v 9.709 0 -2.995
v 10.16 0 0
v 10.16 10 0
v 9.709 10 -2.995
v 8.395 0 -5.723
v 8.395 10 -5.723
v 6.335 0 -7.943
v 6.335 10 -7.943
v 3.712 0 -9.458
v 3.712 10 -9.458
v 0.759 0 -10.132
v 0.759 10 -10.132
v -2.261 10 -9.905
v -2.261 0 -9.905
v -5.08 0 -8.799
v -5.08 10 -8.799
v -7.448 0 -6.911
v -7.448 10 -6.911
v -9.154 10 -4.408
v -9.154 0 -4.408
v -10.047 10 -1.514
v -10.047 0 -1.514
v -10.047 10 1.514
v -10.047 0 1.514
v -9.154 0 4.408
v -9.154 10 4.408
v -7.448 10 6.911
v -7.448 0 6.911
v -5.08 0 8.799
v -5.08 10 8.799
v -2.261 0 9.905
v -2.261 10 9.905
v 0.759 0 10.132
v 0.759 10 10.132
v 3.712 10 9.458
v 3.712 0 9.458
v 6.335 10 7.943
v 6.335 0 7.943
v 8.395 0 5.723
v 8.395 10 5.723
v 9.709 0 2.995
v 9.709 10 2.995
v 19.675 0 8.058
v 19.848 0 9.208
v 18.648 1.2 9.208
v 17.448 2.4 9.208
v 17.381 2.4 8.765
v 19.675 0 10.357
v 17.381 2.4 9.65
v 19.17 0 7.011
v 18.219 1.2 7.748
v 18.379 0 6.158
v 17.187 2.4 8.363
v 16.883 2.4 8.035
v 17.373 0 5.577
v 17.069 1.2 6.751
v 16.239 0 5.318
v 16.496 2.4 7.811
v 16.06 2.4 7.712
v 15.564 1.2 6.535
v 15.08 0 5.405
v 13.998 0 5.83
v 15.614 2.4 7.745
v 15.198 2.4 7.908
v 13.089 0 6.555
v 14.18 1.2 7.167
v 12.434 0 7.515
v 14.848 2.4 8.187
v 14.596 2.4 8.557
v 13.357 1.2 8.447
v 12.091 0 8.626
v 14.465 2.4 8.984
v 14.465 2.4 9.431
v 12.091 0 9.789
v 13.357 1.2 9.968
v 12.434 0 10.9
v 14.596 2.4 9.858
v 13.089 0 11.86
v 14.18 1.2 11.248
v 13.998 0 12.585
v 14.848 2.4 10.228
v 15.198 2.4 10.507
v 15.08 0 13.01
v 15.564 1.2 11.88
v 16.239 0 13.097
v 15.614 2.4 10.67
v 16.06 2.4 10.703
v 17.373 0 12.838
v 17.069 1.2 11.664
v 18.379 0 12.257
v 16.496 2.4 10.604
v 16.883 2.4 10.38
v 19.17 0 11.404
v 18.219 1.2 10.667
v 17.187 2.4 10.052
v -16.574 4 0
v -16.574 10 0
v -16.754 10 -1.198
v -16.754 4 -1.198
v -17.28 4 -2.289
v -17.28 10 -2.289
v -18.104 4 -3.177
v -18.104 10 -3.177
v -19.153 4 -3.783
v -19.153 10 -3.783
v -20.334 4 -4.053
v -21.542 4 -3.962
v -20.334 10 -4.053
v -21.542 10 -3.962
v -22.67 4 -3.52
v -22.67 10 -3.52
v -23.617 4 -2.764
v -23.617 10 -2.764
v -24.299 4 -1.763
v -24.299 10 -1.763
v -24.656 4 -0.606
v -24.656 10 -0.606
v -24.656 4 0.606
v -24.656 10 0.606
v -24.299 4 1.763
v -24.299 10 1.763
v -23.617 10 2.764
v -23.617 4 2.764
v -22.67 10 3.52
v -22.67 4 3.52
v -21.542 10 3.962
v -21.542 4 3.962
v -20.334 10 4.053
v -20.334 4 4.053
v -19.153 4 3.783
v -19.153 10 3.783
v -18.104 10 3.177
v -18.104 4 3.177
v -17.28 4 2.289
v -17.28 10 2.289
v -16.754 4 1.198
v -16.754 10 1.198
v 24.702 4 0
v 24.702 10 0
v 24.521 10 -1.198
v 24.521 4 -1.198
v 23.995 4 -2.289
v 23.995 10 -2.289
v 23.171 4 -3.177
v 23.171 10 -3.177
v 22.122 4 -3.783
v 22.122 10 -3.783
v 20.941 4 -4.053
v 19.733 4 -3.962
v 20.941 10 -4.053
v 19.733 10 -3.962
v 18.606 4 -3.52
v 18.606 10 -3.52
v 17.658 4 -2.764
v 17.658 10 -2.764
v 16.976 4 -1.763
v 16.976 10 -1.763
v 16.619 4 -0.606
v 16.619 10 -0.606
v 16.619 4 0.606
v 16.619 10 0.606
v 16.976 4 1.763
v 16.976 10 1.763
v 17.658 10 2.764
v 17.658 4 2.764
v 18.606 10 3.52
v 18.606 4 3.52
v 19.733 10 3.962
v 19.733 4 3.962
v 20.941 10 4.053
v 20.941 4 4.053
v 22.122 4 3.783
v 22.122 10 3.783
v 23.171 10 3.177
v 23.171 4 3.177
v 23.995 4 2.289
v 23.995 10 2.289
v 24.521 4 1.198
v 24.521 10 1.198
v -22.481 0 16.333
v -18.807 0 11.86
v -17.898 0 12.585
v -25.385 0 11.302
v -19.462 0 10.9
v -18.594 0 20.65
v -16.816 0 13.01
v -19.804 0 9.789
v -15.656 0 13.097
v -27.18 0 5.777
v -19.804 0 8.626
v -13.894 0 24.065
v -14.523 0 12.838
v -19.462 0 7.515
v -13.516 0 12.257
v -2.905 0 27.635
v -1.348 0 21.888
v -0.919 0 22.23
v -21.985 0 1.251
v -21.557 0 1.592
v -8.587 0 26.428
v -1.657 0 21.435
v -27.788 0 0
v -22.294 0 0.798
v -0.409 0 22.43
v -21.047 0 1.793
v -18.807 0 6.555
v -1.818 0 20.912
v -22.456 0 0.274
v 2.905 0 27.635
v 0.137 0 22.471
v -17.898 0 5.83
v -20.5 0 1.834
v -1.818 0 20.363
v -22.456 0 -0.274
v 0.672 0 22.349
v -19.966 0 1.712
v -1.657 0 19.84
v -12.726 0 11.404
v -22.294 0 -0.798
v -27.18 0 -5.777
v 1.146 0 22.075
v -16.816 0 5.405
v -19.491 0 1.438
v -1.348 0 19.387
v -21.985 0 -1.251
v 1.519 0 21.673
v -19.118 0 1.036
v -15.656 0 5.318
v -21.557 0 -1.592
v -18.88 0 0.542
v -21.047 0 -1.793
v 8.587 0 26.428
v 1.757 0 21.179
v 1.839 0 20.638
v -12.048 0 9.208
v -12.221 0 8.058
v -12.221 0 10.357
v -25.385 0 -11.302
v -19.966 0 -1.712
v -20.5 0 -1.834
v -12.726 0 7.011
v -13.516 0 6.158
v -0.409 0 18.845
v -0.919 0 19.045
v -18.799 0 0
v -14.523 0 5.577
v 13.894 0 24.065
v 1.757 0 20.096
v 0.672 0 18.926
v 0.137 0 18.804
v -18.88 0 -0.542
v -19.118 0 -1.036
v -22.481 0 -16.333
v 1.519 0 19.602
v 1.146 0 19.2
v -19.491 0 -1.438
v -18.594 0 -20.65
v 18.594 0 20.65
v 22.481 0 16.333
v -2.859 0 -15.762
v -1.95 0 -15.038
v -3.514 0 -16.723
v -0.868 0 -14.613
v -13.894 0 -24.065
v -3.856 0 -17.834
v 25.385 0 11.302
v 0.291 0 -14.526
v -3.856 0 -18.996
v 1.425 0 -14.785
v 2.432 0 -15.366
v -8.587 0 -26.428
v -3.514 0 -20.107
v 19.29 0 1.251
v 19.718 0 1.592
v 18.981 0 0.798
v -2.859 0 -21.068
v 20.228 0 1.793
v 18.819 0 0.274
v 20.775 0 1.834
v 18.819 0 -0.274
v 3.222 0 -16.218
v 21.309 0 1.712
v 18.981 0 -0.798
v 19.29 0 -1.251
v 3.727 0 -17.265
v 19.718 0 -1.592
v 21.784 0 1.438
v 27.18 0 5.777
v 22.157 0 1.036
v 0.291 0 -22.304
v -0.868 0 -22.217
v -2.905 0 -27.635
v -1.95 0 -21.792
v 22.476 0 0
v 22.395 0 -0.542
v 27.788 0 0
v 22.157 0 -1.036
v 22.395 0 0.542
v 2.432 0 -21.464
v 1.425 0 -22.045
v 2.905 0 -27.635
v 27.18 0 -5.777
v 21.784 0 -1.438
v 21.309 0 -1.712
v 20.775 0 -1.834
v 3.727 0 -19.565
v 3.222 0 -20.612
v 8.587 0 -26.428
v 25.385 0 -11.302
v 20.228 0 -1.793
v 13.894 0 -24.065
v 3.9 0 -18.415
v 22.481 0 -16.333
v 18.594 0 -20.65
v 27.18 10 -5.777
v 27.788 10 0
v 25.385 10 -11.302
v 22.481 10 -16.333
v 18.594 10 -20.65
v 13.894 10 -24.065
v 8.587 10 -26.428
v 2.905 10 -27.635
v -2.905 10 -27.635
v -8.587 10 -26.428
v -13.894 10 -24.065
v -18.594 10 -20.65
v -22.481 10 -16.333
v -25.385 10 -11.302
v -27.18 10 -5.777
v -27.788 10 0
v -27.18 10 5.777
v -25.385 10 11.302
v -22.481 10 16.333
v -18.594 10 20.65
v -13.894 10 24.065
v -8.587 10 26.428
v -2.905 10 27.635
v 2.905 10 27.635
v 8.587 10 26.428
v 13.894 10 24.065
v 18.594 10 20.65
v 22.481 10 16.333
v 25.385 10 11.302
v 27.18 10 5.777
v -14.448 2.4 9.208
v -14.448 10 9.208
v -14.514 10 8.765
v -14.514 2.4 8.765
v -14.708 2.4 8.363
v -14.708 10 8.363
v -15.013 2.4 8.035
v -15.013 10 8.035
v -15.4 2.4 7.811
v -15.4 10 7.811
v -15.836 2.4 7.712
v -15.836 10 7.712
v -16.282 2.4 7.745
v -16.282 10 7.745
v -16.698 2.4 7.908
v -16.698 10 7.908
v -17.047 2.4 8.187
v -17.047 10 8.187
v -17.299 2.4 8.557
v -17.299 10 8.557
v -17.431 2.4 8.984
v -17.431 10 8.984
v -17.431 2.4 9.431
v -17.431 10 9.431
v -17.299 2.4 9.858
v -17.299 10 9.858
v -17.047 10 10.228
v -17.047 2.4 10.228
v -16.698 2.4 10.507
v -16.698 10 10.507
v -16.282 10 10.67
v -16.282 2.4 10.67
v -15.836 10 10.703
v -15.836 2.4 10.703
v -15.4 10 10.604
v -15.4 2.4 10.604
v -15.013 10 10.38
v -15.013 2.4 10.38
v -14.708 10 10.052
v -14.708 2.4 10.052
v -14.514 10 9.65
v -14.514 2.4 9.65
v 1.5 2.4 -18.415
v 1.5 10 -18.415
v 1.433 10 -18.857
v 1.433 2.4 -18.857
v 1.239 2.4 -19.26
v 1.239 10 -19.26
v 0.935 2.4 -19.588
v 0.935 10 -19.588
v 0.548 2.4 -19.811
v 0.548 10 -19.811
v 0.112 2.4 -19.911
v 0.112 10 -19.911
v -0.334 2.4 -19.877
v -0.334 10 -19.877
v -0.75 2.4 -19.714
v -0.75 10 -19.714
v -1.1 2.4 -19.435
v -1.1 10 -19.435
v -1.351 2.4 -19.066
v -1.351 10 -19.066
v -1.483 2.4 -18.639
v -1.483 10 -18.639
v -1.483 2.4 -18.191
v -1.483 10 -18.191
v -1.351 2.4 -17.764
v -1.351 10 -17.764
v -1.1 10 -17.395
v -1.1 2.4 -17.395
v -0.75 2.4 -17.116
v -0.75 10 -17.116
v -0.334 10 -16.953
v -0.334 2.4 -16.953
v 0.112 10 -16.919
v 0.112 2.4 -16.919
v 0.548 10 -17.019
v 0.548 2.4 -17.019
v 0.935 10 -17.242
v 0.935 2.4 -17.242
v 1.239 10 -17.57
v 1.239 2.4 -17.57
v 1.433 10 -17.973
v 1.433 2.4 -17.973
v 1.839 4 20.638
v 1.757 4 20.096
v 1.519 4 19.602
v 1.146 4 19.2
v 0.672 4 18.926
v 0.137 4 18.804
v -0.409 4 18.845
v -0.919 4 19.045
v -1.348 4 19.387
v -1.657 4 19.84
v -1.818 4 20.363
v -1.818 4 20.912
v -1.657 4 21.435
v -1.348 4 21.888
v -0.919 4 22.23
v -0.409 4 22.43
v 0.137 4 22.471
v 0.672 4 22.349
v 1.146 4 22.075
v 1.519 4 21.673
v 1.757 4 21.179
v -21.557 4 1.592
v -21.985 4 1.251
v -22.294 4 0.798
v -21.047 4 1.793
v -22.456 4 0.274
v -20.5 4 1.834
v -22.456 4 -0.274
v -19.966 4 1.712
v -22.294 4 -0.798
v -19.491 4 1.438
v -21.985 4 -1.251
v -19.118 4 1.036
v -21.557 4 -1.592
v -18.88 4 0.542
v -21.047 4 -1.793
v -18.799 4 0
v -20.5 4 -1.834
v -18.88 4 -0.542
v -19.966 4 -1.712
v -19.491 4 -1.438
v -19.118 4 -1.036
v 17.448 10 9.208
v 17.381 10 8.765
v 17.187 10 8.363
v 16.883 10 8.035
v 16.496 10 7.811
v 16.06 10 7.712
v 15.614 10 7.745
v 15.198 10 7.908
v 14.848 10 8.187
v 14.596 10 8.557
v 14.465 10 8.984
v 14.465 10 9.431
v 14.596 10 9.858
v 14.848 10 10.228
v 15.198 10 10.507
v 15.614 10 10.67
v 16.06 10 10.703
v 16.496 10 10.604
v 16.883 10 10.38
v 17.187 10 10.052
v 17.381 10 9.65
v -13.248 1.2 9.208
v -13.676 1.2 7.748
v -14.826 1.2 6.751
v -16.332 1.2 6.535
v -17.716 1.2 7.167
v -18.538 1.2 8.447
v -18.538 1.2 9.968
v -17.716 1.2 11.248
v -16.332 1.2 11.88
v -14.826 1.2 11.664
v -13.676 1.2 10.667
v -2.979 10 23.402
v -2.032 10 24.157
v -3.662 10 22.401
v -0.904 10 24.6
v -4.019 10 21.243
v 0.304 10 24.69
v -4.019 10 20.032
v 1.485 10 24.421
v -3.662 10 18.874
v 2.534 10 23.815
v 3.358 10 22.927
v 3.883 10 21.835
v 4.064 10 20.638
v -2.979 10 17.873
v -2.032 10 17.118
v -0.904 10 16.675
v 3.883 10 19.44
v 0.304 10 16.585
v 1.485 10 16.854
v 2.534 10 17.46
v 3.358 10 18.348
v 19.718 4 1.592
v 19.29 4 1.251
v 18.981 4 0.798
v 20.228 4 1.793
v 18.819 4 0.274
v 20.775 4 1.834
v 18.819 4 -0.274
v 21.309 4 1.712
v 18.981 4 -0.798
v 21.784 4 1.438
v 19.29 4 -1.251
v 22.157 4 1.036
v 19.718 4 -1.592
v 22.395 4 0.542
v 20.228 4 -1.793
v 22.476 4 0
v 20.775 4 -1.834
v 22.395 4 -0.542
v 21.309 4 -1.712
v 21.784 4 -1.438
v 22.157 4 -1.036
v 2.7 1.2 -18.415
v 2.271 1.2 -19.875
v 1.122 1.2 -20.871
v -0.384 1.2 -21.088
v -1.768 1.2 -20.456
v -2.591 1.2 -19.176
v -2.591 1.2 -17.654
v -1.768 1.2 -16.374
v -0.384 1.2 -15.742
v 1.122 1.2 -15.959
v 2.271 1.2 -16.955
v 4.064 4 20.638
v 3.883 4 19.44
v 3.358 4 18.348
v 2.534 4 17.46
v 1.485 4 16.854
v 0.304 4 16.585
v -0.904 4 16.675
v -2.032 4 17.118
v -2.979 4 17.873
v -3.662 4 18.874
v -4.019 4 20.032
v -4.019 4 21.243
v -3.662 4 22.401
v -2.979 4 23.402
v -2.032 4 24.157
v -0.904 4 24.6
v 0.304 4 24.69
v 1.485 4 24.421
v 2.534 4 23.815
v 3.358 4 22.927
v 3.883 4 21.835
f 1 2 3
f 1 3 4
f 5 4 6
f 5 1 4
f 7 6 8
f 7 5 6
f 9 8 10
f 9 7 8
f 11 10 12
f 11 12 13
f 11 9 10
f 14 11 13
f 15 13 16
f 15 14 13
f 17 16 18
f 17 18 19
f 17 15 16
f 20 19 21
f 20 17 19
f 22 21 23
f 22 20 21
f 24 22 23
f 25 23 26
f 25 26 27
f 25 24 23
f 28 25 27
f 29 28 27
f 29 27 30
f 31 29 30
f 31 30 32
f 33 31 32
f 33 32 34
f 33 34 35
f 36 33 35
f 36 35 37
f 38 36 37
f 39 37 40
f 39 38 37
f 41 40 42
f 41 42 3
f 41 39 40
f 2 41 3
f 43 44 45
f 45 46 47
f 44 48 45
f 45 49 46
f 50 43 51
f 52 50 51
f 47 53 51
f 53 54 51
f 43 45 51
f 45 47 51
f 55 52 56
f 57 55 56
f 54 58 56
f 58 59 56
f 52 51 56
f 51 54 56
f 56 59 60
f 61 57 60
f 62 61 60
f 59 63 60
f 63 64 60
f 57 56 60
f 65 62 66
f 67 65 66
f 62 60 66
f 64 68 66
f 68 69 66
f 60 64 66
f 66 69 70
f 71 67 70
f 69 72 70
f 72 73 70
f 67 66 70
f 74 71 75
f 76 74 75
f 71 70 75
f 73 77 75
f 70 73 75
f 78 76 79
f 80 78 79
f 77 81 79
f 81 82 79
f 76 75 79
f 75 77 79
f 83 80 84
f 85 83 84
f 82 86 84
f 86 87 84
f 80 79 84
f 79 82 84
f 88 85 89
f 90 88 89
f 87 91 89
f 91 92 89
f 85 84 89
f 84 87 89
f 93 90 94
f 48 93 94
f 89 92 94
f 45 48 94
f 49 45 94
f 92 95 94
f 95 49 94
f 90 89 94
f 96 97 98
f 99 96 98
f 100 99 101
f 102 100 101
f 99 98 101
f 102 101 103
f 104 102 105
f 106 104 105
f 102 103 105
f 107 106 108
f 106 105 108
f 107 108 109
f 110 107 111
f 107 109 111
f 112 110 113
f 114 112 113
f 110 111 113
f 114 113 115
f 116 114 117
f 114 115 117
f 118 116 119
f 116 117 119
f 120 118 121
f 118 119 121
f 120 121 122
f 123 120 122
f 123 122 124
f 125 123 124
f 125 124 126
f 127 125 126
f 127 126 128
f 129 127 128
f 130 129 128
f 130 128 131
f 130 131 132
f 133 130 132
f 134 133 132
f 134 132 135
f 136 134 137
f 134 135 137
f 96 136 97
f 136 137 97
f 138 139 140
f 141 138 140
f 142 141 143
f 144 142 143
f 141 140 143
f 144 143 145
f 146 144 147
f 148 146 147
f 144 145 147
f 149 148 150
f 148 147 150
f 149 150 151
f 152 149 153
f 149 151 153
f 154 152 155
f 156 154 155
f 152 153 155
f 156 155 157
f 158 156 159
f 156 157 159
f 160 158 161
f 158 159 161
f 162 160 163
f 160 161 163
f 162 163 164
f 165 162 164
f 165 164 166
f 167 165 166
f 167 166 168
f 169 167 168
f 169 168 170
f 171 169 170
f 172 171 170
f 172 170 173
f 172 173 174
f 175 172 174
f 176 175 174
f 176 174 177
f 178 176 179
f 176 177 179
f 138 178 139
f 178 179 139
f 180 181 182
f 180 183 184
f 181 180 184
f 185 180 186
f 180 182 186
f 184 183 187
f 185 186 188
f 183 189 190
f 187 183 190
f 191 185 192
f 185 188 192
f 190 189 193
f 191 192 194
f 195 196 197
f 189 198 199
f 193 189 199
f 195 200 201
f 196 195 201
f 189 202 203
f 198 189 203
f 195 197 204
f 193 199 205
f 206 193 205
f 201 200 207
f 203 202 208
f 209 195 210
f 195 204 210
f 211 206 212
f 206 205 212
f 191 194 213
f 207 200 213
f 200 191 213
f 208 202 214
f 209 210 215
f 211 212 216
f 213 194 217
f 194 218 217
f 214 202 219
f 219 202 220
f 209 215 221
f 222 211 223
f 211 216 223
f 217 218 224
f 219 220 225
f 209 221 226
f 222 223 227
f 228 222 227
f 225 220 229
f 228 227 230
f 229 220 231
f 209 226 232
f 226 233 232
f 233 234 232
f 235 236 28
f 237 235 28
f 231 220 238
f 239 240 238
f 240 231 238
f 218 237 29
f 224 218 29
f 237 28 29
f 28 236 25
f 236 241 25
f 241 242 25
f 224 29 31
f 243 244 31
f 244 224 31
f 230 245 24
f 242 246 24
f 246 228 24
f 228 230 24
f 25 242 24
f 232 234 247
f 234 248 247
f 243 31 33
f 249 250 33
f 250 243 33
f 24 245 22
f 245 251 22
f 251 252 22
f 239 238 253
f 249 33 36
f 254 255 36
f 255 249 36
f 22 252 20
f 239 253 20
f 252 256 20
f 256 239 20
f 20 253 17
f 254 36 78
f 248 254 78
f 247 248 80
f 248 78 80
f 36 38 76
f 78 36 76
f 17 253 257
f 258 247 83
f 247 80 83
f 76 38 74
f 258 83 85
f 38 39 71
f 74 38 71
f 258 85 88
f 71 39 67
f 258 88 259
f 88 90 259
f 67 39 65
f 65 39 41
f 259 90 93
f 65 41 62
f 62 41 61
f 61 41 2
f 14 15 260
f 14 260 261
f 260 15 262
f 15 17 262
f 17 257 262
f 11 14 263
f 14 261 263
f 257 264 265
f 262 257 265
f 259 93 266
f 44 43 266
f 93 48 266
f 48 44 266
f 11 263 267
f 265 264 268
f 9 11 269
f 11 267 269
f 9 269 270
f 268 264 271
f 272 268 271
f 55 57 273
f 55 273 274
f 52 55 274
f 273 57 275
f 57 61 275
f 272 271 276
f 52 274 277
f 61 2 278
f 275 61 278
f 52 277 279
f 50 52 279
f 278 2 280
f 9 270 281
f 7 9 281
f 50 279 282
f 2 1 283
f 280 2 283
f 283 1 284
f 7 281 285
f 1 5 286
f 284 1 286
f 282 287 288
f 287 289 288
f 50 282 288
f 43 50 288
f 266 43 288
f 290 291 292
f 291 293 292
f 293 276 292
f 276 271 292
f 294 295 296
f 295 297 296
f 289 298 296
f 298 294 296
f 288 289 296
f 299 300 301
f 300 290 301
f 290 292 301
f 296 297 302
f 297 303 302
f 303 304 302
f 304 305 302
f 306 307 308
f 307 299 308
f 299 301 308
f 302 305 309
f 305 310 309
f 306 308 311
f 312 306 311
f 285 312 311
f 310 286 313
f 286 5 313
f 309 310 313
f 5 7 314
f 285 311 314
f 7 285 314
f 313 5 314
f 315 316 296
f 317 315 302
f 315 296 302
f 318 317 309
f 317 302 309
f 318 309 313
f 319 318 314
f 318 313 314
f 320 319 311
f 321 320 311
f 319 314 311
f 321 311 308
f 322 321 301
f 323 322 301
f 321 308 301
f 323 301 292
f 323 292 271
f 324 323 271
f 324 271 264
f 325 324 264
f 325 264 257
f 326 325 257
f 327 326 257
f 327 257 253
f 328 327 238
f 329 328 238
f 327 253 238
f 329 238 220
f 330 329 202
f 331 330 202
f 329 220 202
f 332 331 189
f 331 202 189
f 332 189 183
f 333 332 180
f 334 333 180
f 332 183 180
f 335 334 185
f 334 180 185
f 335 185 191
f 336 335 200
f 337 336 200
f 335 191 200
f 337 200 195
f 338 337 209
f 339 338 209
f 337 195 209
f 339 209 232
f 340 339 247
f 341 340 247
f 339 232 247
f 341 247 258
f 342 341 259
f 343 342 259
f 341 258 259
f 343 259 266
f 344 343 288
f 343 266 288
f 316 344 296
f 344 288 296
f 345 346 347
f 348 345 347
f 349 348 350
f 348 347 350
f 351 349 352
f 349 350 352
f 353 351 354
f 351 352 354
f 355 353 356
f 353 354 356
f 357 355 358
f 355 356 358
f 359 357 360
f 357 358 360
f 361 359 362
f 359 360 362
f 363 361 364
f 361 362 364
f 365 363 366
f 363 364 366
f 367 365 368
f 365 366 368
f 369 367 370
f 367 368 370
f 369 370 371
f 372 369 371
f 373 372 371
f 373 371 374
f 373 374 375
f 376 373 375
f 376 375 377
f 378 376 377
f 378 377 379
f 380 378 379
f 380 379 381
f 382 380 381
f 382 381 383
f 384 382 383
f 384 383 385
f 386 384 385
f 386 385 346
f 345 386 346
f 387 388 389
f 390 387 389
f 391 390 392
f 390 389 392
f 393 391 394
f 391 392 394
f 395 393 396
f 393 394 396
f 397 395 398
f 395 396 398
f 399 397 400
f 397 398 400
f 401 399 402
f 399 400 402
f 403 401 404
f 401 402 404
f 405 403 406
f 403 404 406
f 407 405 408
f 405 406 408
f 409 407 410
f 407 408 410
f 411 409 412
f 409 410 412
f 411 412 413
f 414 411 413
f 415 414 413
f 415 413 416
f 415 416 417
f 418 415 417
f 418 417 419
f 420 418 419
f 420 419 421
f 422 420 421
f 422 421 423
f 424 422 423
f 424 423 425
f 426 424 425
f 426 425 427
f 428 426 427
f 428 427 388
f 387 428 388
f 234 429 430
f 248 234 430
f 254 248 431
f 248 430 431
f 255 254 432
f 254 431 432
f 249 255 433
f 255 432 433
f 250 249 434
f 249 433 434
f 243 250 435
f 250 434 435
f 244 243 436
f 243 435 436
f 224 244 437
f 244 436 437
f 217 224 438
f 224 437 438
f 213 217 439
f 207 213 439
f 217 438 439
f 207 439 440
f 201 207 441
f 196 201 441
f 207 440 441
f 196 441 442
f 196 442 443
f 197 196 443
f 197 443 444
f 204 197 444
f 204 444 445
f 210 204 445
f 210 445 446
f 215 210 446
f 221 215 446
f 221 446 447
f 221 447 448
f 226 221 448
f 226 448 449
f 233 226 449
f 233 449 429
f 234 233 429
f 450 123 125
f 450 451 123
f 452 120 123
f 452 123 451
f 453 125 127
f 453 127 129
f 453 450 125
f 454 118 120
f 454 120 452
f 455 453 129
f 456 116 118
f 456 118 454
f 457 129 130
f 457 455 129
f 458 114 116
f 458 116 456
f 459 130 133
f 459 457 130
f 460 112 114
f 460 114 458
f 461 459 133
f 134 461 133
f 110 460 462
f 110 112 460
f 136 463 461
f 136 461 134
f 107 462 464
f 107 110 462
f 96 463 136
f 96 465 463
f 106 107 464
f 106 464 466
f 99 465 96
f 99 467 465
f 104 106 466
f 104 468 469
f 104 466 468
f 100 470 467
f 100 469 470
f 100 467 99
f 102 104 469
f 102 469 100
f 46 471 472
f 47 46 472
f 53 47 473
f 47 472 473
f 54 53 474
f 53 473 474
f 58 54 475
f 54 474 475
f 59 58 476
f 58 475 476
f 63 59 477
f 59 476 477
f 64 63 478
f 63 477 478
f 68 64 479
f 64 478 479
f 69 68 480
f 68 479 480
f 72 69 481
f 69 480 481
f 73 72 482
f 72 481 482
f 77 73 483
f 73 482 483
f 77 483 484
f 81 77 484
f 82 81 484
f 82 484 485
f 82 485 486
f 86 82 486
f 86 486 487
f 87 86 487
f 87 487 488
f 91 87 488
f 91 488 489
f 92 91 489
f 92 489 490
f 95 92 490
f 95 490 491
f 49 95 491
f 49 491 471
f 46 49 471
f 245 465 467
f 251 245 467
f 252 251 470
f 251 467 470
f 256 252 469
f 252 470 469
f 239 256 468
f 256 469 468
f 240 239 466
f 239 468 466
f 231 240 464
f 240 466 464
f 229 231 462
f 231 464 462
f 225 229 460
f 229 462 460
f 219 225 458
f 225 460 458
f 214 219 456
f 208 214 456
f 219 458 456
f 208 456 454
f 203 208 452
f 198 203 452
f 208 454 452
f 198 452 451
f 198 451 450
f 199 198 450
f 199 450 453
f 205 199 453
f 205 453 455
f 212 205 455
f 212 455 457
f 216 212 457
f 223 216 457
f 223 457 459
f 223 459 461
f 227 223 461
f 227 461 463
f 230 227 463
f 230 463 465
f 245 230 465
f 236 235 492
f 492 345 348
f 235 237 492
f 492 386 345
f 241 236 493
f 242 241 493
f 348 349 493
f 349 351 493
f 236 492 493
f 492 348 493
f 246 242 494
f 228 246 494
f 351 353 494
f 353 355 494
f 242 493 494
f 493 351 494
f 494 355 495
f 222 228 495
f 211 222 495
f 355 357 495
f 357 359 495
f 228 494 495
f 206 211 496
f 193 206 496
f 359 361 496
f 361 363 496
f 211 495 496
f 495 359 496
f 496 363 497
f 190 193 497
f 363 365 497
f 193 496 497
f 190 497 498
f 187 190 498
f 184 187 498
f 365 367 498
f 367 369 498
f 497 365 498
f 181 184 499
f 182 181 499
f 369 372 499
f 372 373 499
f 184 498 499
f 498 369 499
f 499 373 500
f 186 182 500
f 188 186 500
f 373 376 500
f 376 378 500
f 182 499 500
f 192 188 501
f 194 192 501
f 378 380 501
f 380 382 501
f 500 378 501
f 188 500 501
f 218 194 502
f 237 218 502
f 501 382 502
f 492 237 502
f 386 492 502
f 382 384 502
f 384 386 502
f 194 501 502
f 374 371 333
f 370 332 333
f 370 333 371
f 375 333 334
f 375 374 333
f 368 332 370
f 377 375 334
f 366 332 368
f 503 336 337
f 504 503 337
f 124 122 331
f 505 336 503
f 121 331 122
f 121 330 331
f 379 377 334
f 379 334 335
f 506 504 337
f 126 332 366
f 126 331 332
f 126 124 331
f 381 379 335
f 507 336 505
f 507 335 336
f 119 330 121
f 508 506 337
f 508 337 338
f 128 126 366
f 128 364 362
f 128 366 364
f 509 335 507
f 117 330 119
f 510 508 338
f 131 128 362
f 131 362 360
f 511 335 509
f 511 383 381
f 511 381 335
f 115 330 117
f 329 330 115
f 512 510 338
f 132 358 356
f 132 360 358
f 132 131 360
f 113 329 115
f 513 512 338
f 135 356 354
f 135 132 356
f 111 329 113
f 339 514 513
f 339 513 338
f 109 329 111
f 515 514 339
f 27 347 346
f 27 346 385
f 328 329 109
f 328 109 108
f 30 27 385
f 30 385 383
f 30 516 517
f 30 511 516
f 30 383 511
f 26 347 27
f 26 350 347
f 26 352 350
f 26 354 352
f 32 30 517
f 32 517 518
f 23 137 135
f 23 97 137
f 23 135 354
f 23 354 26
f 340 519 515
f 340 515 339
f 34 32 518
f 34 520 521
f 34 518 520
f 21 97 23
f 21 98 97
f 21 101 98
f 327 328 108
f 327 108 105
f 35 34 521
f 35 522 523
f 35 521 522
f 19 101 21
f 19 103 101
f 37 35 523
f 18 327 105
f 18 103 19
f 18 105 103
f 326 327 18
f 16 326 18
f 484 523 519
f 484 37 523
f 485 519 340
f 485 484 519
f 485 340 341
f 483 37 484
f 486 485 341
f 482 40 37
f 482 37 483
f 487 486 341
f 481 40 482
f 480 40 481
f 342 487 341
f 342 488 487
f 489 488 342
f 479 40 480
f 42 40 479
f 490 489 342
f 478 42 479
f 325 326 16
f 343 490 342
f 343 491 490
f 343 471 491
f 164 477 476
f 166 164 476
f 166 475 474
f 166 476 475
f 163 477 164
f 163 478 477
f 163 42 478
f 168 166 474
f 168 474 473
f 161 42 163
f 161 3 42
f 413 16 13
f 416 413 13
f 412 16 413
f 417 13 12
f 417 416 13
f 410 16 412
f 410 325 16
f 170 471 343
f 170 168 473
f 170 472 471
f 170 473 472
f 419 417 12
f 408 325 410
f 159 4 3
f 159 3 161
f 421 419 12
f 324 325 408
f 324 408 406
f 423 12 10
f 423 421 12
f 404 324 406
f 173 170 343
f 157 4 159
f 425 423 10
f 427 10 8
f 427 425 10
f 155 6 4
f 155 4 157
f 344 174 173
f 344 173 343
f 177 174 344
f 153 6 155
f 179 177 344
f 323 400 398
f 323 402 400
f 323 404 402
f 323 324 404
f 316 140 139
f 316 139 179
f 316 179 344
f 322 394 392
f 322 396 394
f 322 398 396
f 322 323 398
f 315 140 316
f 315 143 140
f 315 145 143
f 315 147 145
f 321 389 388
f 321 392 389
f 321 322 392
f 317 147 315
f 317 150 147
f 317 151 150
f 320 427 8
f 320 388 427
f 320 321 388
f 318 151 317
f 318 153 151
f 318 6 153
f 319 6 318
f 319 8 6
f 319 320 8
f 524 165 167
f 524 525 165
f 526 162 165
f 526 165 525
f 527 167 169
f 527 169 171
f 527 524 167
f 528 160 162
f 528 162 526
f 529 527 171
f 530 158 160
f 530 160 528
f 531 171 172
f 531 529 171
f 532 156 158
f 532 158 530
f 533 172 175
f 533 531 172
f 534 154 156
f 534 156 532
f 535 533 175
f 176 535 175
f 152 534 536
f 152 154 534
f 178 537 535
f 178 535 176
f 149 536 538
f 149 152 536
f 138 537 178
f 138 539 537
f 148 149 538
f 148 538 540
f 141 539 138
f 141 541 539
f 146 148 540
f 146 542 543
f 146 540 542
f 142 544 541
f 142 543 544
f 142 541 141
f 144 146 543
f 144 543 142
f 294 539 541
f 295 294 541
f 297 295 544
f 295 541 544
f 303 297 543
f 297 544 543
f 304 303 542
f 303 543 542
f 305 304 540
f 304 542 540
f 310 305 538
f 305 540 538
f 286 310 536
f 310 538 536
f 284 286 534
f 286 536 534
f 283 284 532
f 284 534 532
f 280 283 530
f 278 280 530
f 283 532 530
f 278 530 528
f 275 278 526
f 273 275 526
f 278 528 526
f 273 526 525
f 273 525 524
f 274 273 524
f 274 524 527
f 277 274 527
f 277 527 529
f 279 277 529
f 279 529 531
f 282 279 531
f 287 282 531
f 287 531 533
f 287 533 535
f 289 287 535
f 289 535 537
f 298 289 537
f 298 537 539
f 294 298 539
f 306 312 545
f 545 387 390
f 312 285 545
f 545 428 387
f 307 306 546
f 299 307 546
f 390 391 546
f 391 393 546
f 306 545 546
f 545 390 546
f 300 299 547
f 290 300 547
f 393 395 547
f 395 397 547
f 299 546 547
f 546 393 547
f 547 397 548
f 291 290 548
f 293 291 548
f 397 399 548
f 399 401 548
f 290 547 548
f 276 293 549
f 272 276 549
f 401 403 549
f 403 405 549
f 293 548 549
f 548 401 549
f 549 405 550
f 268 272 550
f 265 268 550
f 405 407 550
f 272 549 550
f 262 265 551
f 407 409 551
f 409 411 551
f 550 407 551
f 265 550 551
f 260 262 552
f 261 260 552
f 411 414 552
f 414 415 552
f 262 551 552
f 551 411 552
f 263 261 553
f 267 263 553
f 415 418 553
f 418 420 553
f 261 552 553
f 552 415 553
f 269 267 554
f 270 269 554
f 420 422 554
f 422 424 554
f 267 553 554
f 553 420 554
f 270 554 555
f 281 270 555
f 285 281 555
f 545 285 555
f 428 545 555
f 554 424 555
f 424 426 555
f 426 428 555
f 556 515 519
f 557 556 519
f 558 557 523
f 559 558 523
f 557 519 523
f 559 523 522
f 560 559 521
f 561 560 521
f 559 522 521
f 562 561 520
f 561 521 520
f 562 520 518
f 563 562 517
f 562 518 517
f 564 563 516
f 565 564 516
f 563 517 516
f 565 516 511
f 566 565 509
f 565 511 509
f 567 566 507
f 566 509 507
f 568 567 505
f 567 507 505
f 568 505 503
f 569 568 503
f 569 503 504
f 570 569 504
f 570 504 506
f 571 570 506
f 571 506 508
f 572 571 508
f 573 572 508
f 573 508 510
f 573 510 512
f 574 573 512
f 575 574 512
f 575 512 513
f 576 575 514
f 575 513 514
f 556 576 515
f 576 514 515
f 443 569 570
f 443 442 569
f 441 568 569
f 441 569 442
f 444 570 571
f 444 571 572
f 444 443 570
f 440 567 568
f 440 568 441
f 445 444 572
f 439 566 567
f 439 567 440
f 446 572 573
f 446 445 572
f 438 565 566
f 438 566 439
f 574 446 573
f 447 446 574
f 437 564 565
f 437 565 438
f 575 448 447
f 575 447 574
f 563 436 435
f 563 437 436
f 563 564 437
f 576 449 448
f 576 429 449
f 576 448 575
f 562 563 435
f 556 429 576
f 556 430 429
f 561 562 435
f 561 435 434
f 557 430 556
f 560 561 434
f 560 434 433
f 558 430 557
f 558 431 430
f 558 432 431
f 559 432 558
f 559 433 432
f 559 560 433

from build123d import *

# Parameters (mm, degrees)
SKETCH1_R               = 27.7876
SKETCH1_R_2             = 10.16
RING_DEPTH              = 10
SKETCH2_R               = 1.5
ROBOT_SIDE1_HOLES_DEPTH = 11
ROBOT_SIDE_CHAMFER_SIZE = 2.4
SKETCH3_R               = 1.838724863
TOOL_SIDE_HOLES_DEPTH   = 11
SKETCH4_R               = 4.064
TOOL_SIDE_INSET_DEPTH   = 6


with BuildPart() as part:
    # Sketch1 → Ring (new body)
    with BuildSketch(Plane(origin=(0, 0, 0), x_dir=(1, 0, 0), z_dir=(0, 1, 0))):
        Circle(SKETCH1_R)
        Circle(SKETCH1_R_2, mode=Mode.SUBTRACT)
    extrude(amount=RING_DEPTH)

    # Sketch2 → Robot Side1 - Holes (cut, through all)
    with BuildSketch(Plane(origin=(0, 10, 0), x_dir=(1, 0, 0), z_dir=(0, 1, 0))):
        with Locations((0, 18.415)):
            Circle(SKETCH2_R)
        with Locations((15.947857811, -9.2075)):
            Circle(SKETCH2_R)
        with Locations((-15.947857811, -9.2075)):
            Circle(SKETCH2_R)
    extrude(amount=-ROBOT_SIDE1_HOLES_DEPTH, mode=Mode.SUBTRACT)

    # Robot Side - Chamfer
    robot_side_chamfer_edges = [part.edges().sort_by_distance(p)[0] for p in [
        (-1.5, 0, -18.415),
        (14.447857811, 0, 9.2075),
        (-17.447857811, 0, 9.2075),
    ]]
    chamfer(robot_side_chamfer_edges, length=ROBOT_SIDE_CHAMFER_SIZE)

    # Sketch3 → Tool Side - Holes (cut, through all)
    with BuildSketch(Plane(origin=(0, 10, 0), x_dir=(1, 0, 0), z_dir=(0, 1, 0))):
        with Locations((20.6375, 0)):
            Circle(SKETCH3_R)
        with Locations((0, -20.6375)):
            Circle(SKETCH3_R)
        with Locations((-20.6375, 0)):
            Circle(SKETCH3_R)
    extrude(amount=-TOOL_SIDE_HOLES_DEPTH, mode=Mode.SUBTRACT)

    # Sketch4 → Tool Side - Inset (cut)
    with BuildSketch(Plane(origin=(0, 10, 0), x_dir=(1, 0, 0), z_dir=(0, 1, 0))):
        with Locations((-20.6375, 0)):
            Circle(SKETCH4_R)
        with Locations((0, -20.6375)):
            Circle(SKETCH4_R)
        with Locations((20.6375, 0)):
            Circle(SKETCH4_R)
    extrude(amount=-TOOL_SIDE_INSET_DEPTH, mode=Mode.SUBTRACT)


solid = part.part
